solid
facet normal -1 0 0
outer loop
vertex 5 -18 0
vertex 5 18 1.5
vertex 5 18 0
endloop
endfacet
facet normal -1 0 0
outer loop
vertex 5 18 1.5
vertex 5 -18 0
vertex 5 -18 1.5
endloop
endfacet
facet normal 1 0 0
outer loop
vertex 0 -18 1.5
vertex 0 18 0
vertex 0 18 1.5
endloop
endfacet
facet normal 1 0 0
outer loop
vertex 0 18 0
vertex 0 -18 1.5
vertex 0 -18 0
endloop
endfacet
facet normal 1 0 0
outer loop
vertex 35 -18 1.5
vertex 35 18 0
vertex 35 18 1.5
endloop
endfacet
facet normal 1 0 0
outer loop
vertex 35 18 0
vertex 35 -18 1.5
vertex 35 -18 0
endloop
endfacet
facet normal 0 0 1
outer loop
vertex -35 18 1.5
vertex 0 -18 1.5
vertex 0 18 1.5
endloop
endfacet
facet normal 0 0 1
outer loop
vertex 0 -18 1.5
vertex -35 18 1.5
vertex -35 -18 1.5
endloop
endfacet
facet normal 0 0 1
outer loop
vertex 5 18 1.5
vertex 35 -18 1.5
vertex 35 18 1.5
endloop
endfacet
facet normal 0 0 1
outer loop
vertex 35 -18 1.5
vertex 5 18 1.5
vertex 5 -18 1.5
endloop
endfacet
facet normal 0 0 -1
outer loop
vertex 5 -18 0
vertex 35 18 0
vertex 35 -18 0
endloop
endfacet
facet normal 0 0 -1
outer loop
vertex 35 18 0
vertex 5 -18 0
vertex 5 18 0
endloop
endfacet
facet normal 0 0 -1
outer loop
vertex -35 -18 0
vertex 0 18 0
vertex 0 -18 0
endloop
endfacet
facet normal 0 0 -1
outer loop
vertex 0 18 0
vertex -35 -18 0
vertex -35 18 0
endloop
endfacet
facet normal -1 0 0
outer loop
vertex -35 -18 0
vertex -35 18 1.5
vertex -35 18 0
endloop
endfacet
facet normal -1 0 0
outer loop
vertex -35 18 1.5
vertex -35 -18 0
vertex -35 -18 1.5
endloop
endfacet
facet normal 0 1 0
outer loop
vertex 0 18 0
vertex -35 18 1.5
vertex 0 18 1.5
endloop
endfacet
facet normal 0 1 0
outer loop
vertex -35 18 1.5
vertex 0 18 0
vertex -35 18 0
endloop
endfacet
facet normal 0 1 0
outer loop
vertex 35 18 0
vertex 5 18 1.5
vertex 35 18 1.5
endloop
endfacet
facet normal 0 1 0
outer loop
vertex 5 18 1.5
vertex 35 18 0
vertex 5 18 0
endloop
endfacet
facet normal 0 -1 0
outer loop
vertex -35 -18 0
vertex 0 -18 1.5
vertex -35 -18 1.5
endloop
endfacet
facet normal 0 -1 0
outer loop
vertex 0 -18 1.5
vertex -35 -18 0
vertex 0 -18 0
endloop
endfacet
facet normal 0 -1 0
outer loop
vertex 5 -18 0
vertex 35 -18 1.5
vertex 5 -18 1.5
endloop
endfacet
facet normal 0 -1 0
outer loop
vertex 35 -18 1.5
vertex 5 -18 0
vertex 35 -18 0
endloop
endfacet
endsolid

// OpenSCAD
// Agarose gel comb - a flat plate with a back bar and a row of rectangular teeth, for casting
// horizontal gels. NOVEL general part.
//

cols   = 10;
teeth_d = 5.0;
teeth_l = 12;
pitch  = 1.5;
bar_w   = 12;
t       = 1.5;

$fn = 48;

p2 = teeth_d + pitch;                 // centre-to-centre pitch
Lx = 70;                              // spine length (X)
wy = bar_w + 2 * teeth_l;             // overall width (Y): spine + 2x the overhanging teeth

difference() {
    translate([-Lx / 2, -wy / 2, 0]) cube([Lx, wy, t]);
    for (i = [-cols / 2 : 1 : cols / 2 - 1])
        translate([0, i * p2 + (cols % 2 == 1 ? pitch / 2 : 0), -1]) cube([teeth_d, teeth_l, t + 2]);   // teeth pockets
}
